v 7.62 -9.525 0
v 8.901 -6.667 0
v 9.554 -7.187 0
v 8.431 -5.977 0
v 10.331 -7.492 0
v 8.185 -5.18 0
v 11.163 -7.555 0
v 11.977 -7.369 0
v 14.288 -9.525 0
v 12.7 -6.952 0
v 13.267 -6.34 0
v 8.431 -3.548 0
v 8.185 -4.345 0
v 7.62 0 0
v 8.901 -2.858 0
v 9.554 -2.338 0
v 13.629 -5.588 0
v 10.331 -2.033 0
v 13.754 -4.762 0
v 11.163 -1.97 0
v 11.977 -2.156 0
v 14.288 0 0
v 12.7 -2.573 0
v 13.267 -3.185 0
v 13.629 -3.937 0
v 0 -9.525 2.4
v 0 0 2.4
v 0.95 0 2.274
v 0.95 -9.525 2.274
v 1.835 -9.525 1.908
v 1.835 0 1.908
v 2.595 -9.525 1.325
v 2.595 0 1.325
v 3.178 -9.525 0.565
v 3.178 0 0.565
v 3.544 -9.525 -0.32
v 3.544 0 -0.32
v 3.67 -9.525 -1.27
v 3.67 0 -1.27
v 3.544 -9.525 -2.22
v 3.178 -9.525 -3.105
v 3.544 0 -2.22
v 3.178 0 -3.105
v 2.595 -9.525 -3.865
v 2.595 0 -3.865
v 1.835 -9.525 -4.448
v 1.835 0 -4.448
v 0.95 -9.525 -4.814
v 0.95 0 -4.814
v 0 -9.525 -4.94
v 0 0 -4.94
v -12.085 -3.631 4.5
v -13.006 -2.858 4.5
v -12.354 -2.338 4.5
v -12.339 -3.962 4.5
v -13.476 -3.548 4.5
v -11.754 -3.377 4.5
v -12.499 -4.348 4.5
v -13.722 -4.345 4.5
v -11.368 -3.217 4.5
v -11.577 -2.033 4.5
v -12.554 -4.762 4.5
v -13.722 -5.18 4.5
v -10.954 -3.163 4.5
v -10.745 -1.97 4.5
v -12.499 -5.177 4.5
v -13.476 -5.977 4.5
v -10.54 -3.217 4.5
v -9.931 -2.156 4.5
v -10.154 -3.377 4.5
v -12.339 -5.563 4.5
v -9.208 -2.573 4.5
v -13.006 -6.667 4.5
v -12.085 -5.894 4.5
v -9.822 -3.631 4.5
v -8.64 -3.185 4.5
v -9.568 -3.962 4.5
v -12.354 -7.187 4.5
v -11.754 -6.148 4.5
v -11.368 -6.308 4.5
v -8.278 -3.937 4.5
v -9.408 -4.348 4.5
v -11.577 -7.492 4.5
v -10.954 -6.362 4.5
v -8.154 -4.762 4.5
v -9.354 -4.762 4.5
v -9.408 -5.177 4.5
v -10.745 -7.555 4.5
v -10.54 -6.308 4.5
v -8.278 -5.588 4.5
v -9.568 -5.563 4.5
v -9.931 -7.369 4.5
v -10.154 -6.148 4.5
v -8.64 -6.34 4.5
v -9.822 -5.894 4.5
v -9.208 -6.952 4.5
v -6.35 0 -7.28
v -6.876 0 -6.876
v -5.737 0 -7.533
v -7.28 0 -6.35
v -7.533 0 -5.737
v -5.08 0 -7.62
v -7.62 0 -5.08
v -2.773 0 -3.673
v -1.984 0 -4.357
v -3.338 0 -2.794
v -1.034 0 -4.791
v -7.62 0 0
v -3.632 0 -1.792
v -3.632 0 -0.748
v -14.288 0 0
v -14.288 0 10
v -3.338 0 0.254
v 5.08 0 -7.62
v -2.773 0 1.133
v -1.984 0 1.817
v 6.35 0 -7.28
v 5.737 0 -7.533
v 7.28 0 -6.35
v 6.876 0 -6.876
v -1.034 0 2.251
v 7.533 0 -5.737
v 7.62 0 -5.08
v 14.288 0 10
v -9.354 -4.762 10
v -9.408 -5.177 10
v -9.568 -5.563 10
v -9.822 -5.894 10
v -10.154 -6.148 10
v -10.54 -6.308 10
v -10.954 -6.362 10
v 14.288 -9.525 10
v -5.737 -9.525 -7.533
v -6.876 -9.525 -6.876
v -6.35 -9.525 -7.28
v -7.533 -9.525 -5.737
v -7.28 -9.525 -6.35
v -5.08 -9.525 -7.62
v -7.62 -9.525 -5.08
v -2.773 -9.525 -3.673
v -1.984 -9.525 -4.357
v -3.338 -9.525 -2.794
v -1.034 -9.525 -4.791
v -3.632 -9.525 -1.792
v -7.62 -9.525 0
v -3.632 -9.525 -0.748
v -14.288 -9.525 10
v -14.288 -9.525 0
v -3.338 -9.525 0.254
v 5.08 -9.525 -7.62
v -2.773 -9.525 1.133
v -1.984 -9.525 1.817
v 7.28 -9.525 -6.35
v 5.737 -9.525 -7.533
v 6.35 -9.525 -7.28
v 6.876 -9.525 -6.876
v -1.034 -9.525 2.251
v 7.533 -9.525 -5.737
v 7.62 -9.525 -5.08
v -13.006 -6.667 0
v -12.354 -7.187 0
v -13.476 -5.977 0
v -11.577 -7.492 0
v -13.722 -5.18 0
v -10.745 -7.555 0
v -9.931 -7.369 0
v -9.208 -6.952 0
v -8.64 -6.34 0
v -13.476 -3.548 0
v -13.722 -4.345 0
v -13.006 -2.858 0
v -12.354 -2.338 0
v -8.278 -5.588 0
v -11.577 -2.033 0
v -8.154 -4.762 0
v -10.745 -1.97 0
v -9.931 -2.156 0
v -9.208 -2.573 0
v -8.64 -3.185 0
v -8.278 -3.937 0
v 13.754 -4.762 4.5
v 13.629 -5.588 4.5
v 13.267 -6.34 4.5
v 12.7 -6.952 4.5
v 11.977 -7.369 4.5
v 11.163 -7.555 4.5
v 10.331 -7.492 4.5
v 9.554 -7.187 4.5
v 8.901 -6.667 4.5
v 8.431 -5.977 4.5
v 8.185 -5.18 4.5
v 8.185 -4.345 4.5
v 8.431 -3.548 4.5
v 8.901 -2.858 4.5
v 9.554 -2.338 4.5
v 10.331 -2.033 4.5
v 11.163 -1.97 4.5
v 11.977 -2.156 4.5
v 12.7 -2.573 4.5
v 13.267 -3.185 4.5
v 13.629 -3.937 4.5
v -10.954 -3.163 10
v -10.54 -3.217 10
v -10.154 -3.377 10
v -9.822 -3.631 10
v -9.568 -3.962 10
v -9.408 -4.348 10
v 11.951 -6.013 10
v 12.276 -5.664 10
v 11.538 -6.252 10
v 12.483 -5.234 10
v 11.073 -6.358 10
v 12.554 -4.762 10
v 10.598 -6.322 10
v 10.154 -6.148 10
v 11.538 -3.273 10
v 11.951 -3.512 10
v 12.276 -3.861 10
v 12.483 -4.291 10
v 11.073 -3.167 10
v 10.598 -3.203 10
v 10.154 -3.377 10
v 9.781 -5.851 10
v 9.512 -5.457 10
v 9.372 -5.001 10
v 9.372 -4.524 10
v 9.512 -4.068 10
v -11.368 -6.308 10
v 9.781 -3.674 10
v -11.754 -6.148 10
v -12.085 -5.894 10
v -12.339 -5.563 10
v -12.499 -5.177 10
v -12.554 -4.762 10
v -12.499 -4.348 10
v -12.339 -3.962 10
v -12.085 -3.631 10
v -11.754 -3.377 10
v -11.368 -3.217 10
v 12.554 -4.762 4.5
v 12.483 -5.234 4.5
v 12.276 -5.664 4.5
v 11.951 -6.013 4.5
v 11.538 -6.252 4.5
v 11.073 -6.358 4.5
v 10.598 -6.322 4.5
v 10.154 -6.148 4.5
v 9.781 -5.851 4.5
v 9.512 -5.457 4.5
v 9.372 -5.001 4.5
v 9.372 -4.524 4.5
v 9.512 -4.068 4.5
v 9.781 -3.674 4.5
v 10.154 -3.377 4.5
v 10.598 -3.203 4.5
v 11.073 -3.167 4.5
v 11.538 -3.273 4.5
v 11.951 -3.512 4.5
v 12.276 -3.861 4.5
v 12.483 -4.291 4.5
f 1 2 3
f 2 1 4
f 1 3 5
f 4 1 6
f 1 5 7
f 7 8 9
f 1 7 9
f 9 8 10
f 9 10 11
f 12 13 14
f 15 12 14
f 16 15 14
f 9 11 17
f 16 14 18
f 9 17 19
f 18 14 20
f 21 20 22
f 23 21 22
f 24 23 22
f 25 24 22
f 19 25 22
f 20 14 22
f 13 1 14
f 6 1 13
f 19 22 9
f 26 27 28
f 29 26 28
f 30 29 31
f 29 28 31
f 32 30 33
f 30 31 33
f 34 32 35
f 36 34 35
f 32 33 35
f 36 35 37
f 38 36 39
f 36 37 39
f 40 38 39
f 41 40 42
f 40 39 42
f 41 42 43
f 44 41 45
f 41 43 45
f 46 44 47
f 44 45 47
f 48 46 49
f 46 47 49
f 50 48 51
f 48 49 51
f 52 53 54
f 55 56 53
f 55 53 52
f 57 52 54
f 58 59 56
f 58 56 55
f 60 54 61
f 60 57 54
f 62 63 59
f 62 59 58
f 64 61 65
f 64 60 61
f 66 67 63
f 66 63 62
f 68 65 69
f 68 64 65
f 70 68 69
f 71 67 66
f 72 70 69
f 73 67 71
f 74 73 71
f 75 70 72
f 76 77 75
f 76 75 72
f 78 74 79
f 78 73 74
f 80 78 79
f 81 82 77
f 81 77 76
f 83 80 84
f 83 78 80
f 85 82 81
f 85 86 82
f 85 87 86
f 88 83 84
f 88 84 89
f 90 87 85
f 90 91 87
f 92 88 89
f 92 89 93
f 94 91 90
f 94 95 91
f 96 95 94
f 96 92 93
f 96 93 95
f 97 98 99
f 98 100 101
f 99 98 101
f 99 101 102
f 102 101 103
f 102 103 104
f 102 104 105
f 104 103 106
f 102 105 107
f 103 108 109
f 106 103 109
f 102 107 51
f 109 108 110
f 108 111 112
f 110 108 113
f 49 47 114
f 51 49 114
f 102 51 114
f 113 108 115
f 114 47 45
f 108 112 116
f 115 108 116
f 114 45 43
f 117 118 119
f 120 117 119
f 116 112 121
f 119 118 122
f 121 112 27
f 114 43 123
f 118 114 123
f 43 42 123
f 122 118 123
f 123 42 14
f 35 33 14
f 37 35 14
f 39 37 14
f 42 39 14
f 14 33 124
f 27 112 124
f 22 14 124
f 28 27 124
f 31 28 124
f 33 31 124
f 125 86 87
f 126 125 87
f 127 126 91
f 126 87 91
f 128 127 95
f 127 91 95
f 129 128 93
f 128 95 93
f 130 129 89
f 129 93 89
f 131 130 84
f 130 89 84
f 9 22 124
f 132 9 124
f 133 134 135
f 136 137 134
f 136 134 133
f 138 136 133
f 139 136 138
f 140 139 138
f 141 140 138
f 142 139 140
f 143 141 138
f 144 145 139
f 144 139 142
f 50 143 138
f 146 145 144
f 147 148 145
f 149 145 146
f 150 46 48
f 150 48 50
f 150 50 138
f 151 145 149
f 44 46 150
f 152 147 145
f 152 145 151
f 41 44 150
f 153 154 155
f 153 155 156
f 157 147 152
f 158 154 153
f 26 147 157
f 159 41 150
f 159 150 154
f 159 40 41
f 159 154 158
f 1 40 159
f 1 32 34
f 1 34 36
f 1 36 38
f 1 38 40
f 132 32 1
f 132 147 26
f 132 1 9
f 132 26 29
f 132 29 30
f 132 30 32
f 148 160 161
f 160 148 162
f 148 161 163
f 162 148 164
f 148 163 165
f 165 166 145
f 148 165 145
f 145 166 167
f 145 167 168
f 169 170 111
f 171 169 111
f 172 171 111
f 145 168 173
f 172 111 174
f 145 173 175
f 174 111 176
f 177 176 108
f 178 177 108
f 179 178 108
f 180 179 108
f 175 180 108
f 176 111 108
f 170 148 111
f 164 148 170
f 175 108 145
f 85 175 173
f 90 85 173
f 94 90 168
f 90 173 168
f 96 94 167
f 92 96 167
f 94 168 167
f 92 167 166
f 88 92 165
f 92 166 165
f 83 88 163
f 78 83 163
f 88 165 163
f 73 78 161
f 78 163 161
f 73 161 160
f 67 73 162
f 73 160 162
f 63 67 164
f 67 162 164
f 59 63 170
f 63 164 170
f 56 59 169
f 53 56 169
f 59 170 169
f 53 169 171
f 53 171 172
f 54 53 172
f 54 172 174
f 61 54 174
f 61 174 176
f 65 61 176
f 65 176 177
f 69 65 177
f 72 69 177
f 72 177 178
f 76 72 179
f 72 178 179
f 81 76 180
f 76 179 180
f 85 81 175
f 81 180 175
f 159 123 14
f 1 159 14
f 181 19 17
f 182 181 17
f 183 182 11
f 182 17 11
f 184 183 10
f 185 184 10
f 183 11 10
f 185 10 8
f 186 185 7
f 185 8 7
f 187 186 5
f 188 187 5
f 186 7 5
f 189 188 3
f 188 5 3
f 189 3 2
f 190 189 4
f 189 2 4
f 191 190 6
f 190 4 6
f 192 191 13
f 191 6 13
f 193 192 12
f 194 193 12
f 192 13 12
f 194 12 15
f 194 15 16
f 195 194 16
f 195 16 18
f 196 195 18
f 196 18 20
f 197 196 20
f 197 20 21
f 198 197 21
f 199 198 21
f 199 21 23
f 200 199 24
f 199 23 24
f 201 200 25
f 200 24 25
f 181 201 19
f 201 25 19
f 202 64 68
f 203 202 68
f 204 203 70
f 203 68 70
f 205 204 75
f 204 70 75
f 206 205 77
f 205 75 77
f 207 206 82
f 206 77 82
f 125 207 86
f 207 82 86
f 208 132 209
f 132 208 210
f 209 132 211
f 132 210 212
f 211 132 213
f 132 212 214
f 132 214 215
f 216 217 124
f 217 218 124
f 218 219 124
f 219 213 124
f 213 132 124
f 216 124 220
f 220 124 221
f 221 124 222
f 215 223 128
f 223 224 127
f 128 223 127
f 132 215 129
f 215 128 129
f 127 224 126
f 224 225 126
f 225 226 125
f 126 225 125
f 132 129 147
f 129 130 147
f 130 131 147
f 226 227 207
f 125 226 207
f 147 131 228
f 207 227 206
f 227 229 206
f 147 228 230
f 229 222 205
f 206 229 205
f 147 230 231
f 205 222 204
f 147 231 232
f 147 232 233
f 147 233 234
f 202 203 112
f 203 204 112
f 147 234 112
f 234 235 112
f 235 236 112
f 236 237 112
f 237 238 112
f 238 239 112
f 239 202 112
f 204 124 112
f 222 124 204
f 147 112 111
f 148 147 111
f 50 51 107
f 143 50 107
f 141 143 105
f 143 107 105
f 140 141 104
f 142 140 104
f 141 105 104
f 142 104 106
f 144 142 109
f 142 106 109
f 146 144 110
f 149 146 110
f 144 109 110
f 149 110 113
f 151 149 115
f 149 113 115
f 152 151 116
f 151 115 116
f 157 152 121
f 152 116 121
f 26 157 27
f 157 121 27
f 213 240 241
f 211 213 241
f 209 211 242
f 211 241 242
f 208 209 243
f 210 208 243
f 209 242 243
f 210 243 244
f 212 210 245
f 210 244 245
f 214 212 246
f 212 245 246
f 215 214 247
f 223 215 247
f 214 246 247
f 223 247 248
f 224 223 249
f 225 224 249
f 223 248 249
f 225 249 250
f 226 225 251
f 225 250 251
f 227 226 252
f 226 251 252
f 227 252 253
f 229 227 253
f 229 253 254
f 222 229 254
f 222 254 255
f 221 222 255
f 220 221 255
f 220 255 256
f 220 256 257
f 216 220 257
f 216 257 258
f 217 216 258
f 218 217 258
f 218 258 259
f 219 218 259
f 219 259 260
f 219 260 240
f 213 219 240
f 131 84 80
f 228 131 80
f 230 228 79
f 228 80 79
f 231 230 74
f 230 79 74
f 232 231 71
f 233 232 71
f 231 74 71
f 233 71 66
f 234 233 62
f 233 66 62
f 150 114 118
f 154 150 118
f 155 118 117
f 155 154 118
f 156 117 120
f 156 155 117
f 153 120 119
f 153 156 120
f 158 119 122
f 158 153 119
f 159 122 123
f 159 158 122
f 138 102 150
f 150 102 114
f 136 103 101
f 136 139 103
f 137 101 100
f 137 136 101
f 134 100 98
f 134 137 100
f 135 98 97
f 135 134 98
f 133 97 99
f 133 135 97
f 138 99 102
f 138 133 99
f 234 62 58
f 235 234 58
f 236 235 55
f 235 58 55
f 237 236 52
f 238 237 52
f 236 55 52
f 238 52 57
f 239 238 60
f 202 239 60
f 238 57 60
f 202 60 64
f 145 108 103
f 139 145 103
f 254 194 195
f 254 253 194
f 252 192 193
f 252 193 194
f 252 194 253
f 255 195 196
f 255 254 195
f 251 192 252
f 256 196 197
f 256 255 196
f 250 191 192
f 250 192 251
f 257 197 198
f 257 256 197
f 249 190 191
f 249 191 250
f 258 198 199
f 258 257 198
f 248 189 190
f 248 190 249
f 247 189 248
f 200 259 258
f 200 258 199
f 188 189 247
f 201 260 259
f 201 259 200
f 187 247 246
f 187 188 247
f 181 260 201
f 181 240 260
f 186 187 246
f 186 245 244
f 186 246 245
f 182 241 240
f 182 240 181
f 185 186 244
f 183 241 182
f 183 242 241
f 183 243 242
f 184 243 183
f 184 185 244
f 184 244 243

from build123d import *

# Parameters (mm, degrees)
F1_DEPTH = 9.525
F2_R     = 1.6
F3_DEPTH = 10
F4_R     = 2.54
F5_R     = 2.8
F6_DEPTH = 4.5


with BuildPart() as f1:
    # F0 (on Front) → F1 (new body)
    with BuildSketch(Plane.XZ):
        with BuildLine():
            Line((-14.2875, 10), (-14.2875, 0))
            Line((-14.2875, 0), (-7.62, 0))
            Line((-7.62, 0), (-7.62, -7.62))
            Line((-7.62, -7.62), (0, -7.62))
            Line((0, -7.62), (0, -4.9395))
            ThreePointArc((0, -4.9395), (-3.6695, -1.27), (0, 2.3995))
            Line((0, 2.3995), (0, 10))
            Line((0, 10), (-14.2875, 10))
        make_face()
        with BuildLine():
            Line((14.2875, 10), (0, 10))
            Line((0, 10), (0, 2.3995))
            ThreePointArc((0, 2.3995), (2.594728, 1.324728), (3.6695, -1.27))
            ThreePointArc((3.6695, -1.27), (2.594728, -3.864728), (0, -4.9395))
            Line((0, -4.9395), (0, -7.62))
            Line((0, -7.62), (7.62, -7.62))
            Line((7.62, -7.62), (7.62, 0))
            Line((7.62, 0), (14.2875, 0))
            Line((14.2875, 0), (14.2875, 10))
        make_face()
    extrude(amount=F1_DEPTH)

    # F2 (on face) → F3 (cut, through all)
    with BuildSketch(Plane(origin=(0, 0, 0), x_dir=(1, 0, 0), z_dir=(0, 0, -1))):
        with BuildLine():
            Line((-10.95375, 4.7625), (-9.35375, 4.7625))
            ThreePointArc((-9.35375, 4.7625), (-9.822379, 5.893871), (-10.95375, 6.3625))
            Line((-10.95375, 6.3625), (-10.95375, 4.7625))
        make_face()
        with BuildLine():
            ThreePointArc((-10.95375, 3.1625), (-9.822379, 3.631129), (-9.35375, 4.7625))
            Line((-9.35375, 4.7625), (-10.95375, 4.7625))
            Line((-10.95375, 4.7625), (-10.95375, 3.1625))
        make_face()
        with BuildLine():
            Line((-10.95375, 4.7625), (-10.95375, 6.3625))
            ThreePointArc((-10.95375, 6.3625), (-12.085121, 5.893871), (-12.55375, 4.7625))
            Line((-12.55375, 4.7625), (-10.95375, 4.7625))
        make_face()
        with BuildLine():
            ThreePointArc((-12.55375, 4.7625), (-12.085121, 3.631129), (-10.95375, 3.1625))
            Line((-10.95375, 3.1625), (-10.95375, 4.7625))
            Line((-10.95375, 4.7625), (-12.55375, 4.7625))
        make_face()
        with Locations((10.95375, 4.7625)):
            Circle(F2_R)
    extrude(amount=-F3_DEPTH, mode=Mode.SUBTRACT)

    # F4
    f4_edges = [f1.edges().sort_by_distance(p)[0] for p in [
        (-7.62, -4.7625, -7.62),
        (7.62, -4.7625, -7.62),
    ]]
    fillet(f4_edges, radius=F4_R)

    # F5 (on face) → F6 (cut)
    with BuildSketch(Plane(origin=(0, 0, 0), x_dir=(1, 0, 0), z_dir=(0, 0, -1))):
        with Locations((-10.95375, 4.7625)):
            Circle(F5_R)
        with Locations((10.95375, 4.7625)):
            Circle(F5_R)
    extrude(amount=-F6_DEPTH, mode=Mode.SUBTRACT)


solid = f1.part
